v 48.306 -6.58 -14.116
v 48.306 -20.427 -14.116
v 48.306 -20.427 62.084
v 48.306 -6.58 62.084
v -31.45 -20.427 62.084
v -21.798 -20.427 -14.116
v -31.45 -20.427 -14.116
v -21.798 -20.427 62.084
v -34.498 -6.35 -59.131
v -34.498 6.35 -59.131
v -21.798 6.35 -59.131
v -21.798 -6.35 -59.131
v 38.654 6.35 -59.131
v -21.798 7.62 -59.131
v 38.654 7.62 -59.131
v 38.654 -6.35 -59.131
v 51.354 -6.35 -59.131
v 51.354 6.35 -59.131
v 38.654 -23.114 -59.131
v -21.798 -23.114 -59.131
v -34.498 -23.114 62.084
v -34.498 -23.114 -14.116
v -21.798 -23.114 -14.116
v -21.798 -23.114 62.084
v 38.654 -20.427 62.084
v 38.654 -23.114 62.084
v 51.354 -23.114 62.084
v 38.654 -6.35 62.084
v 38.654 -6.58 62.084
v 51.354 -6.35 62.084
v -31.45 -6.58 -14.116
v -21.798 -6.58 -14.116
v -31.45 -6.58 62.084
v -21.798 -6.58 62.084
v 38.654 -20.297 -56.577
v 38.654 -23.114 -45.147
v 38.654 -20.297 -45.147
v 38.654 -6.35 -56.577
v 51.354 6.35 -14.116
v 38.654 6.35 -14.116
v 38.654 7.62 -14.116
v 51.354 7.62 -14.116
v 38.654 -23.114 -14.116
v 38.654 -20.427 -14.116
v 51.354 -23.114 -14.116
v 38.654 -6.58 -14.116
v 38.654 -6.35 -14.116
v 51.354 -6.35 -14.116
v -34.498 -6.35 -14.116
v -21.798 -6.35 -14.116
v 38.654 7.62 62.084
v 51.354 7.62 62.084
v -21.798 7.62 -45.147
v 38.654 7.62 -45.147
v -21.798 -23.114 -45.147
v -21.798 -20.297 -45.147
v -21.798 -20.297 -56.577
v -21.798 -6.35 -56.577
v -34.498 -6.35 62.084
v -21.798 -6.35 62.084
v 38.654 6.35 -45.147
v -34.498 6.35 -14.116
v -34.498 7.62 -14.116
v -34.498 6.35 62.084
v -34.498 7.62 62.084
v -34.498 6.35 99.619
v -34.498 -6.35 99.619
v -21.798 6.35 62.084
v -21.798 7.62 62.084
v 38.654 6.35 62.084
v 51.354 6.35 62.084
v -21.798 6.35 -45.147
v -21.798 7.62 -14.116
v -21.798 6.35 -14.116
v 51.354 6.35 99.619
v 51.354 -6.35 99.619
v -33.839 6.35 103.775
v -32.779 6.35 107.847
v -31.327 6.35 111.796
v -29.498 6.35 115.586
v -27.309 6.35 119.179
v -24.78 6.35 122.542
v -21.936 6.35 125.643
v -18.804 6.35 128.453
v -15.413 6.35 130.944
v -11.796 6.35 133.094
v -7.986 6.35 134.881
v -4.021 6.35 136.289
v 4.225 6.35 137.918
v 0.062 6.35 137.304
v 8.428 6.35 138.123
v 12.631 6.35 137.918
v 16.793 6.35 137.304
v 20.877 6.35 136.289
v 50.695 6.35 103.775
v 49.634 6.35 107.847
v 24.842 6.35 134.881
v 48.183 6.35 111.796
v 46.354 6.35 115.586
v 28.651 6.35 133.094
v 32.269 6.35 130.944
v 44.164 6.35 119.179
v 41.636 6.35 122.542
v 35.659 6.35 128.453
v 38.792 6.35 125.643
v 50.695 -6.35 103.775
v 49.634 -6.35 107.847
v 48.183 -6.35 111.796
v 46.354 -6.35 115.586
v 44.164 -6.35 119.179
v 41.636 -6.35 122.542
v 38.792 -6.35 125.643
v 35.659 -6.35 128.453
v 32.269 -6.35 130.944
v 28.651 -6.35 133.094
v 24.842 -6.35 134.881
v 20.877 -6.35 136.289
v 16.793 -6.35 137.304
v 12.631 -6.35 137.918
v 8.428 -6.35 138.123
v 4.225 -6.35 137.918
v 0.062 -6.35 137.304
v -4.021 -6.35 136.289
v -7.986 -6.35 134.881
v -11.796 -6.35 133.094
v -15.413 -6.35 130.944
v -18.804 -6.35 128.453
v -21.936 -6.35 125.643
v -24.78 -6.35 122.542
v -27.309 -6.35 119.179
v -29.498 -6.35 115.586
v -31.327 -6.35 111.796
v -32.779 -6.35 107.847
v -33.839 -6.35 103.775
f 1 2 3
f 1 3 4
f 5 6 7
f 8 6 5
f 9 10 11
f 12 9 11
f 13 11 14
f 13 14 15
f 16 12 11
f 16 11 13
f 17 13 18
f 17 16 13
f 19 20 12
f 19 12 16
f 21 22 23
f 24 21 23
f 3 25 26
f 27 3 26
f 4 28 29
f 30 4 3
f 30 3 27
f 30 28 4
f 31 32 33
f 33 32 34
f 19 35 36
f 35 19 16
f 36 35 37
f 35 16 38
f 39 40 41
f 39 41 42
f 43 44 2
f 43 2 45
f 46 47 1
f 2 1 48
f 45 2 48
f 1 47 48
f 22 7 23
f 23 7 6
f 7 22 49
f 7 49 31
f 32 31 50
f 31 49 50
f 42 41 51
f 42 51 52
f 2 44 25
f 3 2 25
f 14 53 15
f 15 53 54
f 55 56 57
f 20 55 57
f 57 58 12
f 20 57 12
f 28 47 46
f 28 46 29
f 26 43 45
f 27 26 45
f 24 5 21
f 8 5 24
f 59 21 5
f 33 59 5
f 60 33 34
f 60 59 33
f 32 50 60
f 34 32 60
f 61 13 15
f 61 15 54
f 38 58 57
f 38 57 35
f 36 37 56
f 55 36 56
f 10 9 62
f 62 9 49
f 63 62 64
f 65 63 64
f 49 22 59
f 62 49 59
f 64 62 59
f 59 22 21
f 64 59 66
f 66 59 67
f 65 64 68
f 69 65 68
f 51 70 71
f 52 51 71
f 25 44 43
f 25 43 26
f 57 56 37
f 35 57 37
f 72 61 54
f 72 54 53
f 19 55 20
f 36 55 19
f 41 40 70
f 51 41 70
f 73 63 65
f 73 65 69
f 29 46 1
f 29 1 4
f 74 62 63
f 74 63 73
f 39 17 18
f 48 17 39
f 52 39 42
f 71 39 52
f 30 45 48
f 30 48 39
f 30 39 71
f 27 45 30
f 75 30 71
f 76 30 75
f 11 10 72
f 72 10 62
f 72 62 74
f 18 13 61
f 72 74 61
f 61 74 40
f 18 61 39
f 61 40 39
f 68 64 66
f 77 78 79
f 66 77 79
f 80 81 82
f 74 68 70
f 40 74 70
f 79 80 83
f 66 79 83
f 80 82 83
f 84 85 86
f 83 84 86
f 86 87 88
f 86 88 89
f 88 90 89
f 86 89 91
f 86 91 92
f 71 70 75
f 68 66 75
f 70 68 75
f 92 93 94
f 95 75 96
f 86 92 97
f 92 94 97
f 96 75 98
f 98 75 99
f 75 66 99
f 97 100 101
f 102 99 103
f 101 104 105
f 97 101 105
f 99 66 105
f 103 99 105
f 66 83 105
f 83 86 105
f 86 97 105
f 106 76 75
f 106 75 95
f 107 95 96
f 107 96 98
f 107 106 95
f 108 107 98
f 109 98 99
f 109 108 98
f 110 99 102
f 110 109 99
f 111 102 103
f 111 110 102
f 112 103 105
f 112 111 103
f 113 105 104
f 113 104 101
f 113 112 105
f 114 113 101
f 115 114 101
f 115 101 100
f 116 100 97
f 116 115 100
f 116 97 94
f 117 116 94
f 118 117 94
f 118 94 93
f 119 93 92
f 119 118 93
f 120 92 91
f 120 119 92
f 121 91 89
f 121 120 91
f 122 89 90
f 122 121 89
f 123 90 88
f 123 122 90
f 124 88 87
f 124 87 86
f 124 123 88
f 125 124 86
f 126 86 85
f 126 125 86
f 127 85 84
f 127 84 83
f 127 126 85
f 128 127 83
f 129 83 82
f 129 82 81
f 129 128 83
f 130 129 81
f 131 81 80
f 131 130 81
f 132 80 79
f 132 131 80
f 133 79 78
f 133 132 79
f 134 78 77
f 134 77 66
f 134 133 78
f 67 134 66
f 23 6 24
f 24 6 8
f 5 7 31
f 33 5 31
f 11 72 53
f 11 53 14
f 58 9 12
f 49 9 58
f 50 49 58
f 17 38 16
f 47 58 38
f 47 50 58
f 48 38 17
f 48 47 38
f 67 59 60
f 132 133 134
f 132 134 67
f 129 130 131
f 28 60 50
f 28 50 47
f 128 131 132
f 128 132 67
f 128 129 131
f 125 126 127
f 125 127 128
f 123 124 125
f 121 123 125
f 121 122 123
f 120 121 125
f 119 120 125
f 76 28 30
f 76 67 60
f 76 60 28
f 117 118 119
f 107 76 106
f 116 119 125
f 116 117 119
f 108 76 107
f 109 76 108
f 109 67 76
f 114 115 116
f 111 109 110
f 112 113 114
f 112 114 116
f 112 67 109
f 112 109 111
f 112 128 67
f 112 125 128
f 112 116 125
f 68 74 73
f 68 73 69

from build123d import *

# Parameters (mm, degrees)
F1_DEPTH      = 6.35
F0_W          = 12.7
F0_H          = 76.2
F2_DEPTH      = 23.114
F2_DEPTH_BACK = 7.62
F3_W          = 13.847873
F3_H          = 81.732566
F4_DEPTH      = 70.104
F4_DEPTH_BACK = 9.652
F5_W          = 60.452
F5_H          = 13.946542
F6_DEPTH      = 11.43


with BuildPart() as f1:
    # F0 (on Front) → F1 (new body, symmetric)
    with BuildSketch(Plane.XZ):
        Polygon((38.65377, -59.13078), (51.35377, -59.13078), (51.35377, -21.038081), (51.35377, -14.115668), (38.65377, -14.115668), (38.65377, 62.084332), (51.35377, 62.084332), (51.35377, 68.237185), (51.35377, 99.61922), (-34.49823, 99.61922), (-34.49823, 69.908112), (-34.49823, 62.084332), (-21.79823, 62.084332), (-21.79823, -14.115668), (-34.49823, -14.115668), (-34.49823, -20.321971), (-34.49823, -59.13078), (-30.726077, -59.13078), (-21.79823, -59.13078), (-21.79823, -45.147181), (38.65377, -45.147181), align=None)
        with BuildLine():
            Line((-34.49823, 99.61922), (51.35377, 99.61922))
            ThreePointArc((51.35377, 99.61922), (8.42777, 138.122584), (-34.49823, 99.61922))
        make_face()
    extrude(amount=F1_DEPTH, both=True)

    # F0 (on Front) → F2 (join, two sides)
    with BuildSketch(Plane.XZ) as f2_sk:
        with Locations((-28.14823, 23.984332)):
            Rectangle(F0_W, F0_H)
        with Locations((45.00377, 23.984332)):
            Rectangle(F0_W, F0_H)
        Polygon((35.63362, -59.13078), (38.65377, -59.13078), (38.65377, -45.147181), (-21.79823, -45.147181), (-21.79823, -59.13078), align=None)
    extrude(amount=F2_DEPTH)
    extrude(f2_sk.sketch, amount=-F2_DEPTH_BACK)

    # F3 (on face) → F4 (cut, two sides)
    with BuildSketch(Plane.YZ.offset(-21.79823)) as f4_sk:
        with Locations((-13.503438, 23.114669)):
            Rectangle(F3_W, F3_H)
    extrude(amount=F4_DEPTH, mode=Mode.SUBTRACT)
    extrude(f4_sk.sketch, amount=-F4_DEPTH_BACK, mode=Mode.SUBTRACT)

    # F5 (on face) → F6 (cut)
    with BuildSketch(Plane.XY.offset(-45.147181)):
        with Locations((8.42777, -13.323271)):
            Rectangle(F5_W, F5_H)
    extrude(amount=-F6_DEPTH, mode=Mode.SUBTRACT)


solid = f1.part
